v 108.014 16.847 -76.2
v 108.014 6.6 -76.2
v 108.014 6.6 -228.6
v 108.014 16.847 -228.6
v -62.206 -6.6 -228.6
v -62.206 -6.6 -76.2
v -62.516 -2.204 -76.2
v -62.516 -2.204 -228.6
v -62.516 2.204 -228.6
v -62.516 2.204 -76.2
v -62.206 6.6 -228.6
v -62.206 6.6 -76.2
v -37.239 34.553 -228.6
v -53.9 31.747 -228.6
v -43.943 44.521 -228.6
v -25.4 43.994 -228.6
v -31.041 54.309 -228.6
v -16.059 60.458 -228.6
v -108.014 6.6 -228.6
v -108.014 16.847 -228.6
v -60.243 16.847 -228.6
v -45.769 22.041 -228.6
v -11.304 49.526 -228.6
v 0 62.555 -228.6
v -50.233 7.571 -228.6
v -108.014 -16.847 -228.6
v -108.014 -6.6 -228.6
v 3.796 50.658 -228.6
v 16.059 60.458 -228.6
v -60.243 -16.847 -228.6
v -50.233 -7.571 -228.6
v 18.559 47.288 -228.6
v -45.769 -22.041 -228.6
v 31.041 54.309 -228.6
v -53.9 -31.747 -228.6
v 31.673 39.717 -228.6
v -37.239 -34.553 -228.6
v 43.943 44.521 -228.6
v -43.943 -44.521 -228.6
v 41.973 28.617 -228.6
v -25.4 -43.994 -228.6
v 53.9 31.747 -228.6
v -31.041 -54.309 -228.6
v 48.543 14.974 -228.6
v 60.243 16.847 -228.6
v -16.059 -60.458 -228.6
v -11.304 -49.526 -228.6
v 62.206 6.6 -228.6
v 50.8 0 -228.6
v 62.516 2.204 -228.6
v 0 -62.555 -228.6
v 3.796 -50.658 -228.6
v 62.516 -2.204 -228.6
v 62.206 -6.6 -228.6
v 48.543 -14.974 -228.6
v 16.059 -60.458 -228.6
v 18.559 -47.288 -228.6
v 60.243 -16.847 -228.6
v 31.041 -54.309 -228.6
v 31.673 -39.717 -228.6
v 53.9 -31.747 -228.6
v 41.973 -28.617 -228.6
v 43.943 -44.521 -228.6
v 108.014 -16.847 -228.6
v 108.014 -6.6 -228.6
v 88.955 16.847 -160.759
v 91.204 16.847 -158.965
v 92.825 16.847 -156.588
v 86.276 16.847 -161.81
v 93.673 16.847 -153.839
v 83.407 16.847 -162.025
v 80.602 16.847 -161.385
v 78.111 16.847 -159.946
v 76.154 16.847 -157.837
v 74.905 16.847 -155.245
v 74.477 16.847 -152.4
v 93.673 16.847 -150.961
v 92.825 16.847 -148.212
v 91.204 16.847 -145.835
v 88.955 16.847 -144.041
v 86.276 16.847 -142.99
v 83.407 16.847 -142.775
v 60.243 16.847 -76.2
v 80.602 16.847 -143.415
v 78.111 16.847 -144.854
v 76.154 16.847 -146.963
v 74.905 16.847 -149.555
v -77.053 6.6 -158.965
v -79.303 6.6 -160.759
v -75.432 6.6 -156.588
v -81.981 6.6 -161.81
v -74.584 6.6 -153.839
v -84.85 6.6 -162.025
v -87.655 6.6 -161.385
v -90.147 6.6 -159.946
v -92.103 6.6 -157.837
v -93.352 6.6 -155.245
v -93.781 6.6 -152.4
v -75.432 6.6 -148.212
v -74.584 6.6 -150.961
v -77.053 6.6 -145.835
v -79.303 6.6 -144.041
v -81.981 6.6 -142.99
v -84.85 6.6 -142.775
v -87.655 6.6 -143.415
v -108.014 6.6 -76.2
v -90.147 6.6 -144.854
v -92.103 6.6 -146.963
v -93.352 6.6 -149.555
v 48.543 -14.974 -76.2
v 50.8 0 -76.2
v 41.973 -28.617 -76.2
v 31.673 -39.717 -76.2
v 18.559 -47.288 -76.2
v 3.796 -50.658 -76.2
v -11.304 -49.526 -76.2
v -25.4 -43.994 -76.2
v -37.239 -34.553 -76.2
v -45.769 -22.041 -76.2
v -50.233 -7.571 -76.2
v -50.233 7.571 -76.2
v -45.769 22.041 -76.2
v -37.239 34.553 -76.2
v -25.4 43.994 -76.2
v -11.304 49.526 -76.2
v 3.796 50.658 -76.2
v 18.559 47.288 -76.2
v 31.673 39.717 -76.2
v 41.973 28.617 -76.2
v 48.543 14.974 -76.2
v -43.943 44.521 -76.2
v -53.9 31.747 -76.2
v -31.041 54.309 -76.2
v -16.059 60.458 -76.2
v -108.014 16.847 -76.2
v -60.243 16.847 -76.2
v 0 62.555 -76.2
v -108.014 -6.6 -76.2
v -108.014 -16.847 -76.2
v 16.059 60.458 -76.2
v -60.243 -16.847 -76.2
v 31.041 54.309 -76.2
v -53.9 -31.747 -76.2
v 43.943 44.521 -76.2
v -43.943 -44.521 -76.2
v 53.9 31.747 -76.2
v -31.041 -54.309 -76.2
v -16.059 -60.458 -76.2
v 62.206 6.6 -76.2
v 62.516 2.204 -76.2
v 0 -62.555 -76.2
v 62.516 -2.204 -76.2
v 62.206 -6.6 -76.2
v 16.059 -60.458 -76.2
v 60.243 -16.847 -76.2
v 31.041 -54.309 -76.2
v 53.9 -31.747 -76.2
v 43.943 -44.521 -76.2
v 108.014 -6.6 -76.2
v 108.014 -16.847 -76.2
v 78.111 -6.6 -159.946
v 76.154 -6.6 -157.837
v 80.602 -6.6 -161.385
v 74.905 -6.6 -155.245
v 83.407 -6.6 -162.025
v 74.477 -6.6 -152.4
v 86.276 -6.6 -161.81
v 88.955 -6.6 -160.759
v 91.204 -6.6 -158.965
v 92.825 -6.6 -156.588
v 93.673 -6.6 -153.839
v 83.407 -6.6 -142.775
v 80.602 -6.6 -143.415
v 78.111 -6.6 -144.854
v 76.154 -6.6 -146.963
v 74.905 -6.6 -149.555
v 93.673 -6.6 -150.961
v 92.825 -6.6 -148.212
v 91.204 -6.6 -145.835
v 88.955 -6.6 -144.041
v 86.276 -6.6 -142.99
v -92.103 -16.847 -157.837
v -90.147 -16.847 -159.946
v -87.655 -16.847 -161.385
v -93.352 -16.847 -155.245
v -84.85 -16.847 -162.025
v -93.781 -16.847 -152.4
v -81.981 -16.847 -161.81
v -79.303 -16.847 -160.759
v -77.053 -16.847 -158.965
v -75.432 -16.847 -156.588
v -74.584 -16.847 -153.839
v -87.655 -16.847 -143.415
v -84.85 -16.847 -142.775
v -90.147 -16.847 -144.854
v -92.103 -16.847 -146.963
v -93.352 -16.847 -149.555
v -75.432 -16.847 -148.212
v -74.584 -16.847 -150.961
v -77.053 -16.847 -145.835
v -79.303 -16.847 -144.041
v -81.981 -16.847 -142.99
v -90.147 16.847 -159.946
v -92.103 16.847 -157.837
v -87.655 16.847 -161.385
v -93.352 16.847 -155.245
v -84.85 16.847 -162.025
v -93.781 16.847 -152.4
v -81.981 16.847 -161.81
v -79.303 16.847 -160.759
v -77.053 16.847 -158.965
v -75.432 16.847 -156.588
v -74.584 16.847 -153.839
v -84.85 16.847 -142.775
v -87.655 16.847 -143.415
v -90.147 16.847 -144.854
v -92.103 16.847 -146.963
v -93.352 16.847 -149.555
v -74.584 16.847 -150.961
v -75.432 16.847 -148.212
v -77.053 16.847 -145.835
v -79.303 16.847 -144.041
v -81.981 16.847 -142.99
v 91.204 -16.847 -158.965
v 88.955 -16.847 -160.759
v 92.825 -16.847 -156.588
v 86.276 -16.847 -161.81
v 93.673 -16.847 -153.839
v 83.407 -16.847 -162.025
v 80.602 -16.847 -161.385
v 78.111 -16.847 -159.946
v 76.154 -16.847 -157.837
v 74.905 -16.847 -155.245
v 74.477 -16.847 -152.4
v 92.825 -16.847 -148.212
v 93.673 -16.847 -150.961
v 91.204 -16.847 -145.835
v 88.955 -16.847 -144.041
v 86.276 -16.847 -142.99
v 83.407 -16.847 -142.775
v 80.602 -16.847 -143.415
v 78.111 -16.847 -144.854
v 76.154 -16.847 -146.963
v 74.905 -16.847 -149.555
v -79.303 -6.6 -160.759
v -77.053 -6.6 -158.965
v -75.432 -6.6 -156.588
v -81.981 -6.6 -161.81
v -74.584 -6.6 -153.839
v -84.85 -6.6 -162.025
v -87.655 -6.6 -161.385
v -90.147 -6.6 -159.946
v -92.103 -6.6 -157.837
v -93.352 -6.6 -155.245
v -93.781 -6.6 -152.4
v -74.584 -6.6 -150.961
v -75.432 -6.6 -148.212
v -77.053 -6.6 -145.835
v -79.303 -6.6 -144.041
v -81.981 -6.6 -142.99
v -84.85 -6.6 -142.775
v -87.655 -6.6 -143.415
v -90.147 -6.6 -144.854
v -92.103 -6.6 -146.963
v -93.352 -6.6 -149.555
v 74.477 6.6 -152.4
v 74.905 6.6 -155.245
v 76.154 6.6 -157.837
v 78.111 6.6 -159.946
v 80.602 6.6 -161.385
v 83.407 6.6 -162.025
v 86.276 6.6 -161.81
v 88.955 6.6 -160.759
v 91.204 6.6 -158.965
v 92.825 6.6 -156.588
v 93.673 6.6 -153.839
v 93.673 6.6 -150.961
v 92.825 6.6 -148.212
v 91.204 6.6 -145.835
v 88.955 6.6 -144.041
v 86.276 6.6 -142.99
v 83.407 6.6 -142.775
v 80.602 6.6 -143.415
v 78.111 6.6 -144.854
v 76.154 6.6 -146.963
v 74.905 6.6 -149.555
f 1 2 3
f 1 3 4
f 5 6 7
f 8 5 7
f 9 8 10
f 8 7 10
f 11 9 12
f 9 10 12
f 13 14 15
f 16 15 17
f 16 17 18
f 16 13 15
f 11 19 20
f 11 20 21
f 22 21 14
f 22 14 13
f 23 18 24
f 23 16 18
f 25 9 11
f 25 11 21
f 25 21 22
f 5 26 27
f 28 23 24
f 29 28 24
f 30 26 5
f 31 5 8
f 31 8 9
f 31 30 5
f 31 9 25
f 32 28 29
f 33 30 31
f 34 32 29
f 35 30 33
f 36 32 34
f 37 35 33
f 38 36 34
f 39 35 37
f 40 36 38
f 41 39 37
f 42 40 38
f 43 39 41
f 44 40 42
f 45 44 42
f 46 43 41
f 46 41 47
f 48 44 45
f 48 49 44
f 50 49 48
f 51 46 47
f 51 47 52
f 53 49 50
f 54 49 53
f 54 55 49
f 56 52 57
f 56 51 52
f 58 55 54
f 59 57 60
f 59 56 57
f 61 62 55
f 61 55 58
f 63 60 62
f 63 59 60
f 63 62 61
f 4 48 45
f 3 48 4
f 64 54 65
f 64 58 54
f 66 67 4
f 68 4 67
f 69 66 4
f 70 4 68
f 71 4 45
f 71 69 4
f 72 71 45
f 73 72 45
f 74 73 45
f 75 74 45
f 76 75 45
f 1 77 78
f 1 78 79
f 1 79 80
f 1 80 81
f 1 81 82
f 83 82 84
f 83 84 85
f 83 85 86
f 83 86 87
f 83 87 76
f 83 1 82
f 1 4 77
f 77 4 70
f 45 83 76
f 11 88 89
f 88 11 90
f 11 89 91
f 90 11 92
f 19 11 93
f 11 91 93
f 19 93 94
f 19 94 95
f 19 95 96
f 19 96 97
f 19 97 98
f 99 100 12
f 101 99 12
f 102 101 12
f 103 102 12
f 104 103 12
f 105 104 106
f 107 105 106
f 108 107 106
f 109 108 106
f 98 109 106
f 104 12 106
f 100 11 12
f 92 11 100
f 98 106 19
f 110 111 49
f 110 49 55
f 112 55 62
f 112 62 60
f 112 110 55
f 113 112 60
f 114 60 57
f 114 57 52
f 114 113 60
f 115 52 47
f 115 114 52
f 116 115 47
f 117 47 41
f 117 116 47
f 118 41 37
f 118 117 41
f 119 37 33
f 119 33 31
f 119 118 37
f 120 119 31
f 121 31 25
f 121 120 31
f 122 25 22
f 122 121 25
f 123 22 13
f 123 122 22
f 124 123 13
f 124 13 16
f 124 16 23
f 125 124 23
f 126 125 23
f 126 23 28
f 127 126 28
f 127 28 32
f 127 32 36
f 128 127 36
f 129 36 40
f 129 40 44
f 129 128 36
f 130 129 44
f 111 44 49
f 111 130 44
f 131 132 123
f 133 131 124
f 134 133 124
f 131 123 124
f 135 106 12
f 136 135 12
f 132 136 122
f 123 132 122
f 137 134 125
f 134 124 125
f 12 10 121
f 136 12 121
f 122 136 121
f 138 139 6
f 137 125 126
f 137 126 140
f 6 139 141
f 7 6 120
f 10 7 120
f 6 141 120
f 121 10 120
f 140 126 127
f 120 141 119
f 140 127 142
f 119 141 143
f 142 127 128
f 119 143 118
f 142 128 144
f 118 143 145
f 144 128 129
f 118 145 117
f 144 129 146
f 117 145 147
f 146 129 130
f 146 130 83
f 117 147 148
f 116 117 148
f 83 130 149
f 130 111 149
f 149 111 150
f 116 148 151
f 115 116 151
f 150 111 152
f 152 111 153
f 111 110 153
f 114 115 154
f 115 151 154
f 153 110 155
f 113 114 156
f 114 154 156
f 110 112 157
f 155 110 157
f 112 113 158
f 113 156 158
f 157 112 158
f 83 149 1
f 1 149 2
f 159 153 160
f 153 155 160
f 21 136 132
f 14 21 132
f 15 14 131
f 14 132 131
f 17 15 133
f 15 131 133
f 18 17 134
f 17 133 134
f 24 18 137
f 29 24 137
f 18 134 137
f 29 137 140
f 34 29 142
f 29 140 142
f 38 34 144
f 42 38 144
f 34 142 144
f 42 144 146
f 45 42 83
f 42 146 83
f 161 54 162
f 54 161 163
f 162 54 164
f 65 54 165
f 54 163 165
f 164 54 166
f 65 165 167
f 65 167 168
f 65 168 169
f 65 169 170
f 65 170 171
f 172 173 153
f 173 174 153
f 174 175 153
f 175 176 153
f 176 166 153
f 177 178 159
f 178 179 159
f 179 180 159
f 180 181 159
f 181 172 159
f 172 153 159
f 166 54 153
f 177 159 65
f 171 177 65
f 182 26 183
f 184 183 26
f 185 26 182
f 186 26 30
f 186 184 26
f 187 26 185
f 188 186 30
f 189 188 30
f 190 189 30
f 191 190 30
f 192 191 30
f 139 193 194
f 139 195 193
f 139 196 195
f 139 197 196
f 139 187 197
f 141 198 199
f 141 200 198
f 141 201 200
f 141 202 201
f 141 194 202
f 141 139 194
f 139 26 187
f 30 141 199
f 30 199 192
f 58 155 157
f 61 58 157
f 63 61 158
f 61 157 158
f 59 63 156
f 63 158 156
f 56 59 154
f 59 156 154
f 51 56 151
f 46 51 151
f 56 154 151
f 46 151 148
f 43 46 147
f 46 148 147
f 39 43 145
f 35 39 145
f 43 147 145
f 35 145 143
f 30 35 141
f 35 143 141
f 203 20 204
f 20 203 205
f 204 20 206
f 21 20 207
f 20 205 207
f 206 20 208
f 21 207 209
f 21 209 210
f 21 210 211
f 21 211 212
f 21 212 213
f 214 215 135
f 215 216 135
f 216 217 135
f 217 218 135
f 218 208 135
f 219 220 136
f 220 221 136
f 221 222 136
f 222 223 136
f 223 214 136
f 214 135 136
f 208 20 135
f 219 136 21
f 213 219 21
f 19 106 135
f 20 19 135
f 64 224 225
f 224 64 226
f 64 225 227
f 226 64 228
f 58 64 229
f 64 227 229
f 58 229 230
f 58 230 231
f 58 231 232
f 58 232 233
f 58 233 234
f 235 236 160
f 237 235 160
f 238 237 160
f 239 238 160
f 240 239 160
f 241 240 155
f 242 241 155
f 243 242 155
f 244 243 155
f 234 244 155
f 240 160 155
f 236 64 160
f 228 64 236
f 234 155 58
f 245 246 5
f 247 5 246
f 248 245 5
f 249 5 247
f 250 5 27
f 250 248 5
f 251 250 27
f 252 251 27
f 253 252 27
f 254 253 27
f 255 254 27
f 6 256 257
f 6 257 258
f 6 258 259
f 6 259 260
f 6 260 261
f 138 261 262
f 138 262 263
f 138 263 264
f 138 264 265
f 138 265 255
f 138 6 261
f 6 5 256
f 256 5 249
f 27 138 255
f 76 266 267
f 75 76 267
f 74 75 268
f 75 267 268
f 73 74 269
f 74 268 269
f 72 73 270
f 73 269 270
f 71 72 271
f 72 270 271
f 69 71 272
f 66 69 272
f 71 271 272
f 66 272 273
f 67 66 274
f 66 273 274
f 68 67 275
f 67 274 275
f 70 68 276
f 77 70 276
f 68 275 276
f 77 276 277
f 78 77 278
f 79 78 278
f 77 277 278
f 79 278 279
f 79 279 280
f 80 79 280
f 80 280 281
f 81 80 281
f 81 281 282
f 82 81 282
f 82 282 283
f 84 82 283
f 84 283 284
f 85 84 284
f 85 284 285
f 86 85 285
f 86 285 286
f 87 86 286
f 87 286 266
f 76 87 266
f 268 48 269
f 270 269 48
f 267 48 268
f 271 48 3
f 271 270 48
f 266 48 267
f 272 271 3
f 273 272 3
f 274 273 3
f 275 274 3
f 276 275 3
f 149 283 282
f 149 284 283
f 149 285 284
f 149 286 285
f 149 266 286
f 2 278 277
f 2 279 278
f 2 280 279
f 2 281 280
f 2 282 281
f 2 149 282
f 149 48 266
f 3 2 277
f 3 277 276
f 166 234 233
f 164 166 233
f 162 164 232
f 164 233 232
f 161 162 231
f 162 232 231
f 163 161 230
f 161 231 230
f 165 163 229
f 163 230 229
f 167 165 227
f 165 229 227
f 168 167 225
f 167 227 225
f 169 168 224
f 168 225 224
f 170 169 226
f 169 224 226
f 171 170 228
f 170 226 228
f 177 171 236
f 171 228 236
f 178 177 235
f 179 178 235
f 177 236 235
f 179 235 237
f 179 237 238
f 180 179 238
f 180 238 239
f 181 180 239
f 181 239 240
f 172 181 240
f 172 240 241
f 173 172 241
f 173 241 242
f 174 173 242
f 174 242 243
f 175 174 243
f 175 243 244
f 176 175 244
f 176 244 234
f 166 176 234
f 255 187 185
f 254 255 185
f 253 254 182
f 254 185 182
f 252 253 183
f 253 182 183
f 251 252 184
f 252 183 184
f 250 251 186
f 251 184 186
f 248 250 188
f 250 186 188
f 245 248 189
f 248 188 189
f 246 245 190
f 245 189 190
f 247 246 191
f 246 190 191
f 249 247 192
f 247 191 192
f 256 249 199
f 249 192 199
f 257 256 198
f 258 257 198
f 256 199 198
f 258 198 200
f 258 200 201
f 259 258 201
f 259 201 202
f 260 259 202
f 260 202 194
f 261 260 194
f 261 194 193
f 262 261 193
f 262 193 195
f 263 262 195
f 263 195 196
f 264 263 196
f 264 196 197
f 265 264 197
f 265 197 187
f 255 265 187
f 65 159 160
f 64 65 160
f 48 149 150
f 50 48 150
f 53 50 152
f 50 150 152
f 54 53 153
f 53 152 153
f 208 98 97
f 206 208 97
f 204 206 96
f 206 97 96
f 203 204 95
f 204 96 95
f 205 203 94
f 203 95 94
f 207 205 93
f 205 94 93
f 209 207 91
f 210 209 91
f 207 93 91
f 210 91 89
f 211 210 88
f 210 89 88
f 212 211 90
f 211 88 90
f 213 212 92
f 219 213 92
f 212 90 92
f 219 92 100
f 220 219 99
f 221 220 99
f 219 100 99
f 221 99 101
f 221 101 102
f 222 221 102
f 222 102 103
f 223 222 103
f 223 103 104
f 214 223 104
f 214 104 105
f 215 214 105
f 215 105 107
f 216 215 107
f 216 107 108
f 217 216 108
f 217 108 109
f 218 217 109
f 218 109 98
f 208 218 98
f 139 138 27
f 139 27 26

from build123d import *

# Parameters (mm, degrees)
SKETCH_R     = 50.8
PAD_DEPTH    = 152.4
SKETCH001_R  = 9.652
POCKET_DEPTH = 79.402154


with BuildPart() as part:
    # Sketch → Pad (new body)
    with BuildSketch(Plane(origin=(0, 0, -76.2), x_dir=(1, 0, 0), z_dir=(0, 0, -1))):
        with BuildLine():
            ThreePointArc((62.205505, -6.599598), (62.554612, 0), (62.205505, 6.599598))
            Line((62.205505, 6.599598), (108.01374, 6.599598))
            Line((108.01374, 6.599598), (108.01374, 16.846542))
            Line((108.01374, 16.846542), (60.243452, 16.846542))
            ThreePointArc((60.243452, 16.846542), (0, 62.554612), (-60.243452, 16.846542))
            Line((-108.01374, 16.846542), (-60.243452, 16.846542))
            Line((-108.01374, 6.599598), (-108.01374, 16.846542))
            Line((-62.205505, 6.599598), (-108.01374, 6.599598))
            ThreePointArc((-62.205505, 6.599598), (-62.554612, 0), (-62.205505, -6.599598))
            Line((-62.205505, -6.599598), (-108.01374, -6.599598))
            Line((-108.01374, -6.599598), (-108.01374, -16.846542))
            Line((-108.01374, -16.846542), (-60.243452, -16.846542))
            ThreePointArc((-60.243452, -16.846542), (0, -62.554612), (60.243452, -16.846542))
            Line((108.01374, -16.846542), (60.243452, -16.846542))
            Line((108.01374, -6.599598), (108.01374, -16.846542))
            Line((62.205505, -6.599598), (108.01374, -6.599598))
        make_face()
        Circle(SKETCH_R, mode=Mode.SUBTRACT)
    extrude(amount=PAD_DEPTH)

    # Sketch001 → Pocket (cut, through all)
    with BuildSketch(Plane(origin=(0, -16.846542, -76.2), x_dir=(-1, 0, 0), z_dir=(0, -1, 0))):
        with Locations((-84.128596, 76.2)):
            Circle(SKETCH001_R)
        with Locations((84.128596, 76.2)):
            Circle(SKETCH001_R)
    extrude(amount=-POCKET_DEPTH, mode=Mode.SUBTRACT)


solid = part.part
